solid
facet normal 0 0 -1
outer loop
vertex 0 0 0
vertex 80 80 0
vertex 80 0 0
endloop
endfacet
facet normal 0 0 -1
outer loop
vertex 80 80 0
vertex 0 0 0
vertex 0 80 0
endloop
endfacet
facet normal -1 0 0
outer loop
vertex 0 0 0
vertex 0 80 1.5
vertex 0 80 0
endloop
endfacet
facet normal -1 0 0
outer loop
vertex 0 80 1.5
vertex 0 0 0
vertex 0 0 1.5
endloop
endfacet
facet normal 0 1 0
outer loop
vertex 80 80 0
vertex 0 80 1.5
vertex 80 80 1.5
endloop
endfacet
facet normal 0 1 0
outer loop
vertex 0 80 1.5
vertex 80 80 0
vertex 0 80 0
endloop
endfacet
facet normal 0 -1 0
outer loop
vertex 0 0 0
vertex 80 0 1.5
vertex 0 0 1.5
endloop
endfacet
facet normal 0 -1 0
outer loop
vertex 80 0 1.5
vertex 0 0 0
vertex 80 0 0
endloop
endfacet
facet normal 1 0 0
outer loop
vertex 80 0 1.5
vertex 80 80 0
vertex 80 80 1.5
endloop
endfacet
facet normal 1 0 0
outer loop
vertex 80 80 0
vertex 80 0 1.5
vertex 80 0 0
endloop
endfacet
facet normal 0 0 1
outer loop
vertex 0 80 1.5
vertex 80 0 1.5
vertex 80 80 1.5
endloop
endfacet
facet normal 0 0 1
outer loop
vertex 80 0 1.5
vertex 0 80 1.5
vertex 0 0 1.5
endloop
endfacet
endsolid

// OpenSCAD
colors = ["red", "orange", "yellow", "green", "aqua","blue","purple", "violet"];
size = 10;

module stripe(m) {
    color(colors[m]) {
        translate([m*size,0,0]) cube([size,len(colors)*size,1]);
        translate([0,m*size,1]) cube([size*len(colors),size,0.5]);
    }
}

material = 0;
if (material == 0) {
    for (m = [0:len(colors)-1]) {
        stripe(m);
    }
} else if (material <= len(colors)) {
    stripe(material-1);
}
